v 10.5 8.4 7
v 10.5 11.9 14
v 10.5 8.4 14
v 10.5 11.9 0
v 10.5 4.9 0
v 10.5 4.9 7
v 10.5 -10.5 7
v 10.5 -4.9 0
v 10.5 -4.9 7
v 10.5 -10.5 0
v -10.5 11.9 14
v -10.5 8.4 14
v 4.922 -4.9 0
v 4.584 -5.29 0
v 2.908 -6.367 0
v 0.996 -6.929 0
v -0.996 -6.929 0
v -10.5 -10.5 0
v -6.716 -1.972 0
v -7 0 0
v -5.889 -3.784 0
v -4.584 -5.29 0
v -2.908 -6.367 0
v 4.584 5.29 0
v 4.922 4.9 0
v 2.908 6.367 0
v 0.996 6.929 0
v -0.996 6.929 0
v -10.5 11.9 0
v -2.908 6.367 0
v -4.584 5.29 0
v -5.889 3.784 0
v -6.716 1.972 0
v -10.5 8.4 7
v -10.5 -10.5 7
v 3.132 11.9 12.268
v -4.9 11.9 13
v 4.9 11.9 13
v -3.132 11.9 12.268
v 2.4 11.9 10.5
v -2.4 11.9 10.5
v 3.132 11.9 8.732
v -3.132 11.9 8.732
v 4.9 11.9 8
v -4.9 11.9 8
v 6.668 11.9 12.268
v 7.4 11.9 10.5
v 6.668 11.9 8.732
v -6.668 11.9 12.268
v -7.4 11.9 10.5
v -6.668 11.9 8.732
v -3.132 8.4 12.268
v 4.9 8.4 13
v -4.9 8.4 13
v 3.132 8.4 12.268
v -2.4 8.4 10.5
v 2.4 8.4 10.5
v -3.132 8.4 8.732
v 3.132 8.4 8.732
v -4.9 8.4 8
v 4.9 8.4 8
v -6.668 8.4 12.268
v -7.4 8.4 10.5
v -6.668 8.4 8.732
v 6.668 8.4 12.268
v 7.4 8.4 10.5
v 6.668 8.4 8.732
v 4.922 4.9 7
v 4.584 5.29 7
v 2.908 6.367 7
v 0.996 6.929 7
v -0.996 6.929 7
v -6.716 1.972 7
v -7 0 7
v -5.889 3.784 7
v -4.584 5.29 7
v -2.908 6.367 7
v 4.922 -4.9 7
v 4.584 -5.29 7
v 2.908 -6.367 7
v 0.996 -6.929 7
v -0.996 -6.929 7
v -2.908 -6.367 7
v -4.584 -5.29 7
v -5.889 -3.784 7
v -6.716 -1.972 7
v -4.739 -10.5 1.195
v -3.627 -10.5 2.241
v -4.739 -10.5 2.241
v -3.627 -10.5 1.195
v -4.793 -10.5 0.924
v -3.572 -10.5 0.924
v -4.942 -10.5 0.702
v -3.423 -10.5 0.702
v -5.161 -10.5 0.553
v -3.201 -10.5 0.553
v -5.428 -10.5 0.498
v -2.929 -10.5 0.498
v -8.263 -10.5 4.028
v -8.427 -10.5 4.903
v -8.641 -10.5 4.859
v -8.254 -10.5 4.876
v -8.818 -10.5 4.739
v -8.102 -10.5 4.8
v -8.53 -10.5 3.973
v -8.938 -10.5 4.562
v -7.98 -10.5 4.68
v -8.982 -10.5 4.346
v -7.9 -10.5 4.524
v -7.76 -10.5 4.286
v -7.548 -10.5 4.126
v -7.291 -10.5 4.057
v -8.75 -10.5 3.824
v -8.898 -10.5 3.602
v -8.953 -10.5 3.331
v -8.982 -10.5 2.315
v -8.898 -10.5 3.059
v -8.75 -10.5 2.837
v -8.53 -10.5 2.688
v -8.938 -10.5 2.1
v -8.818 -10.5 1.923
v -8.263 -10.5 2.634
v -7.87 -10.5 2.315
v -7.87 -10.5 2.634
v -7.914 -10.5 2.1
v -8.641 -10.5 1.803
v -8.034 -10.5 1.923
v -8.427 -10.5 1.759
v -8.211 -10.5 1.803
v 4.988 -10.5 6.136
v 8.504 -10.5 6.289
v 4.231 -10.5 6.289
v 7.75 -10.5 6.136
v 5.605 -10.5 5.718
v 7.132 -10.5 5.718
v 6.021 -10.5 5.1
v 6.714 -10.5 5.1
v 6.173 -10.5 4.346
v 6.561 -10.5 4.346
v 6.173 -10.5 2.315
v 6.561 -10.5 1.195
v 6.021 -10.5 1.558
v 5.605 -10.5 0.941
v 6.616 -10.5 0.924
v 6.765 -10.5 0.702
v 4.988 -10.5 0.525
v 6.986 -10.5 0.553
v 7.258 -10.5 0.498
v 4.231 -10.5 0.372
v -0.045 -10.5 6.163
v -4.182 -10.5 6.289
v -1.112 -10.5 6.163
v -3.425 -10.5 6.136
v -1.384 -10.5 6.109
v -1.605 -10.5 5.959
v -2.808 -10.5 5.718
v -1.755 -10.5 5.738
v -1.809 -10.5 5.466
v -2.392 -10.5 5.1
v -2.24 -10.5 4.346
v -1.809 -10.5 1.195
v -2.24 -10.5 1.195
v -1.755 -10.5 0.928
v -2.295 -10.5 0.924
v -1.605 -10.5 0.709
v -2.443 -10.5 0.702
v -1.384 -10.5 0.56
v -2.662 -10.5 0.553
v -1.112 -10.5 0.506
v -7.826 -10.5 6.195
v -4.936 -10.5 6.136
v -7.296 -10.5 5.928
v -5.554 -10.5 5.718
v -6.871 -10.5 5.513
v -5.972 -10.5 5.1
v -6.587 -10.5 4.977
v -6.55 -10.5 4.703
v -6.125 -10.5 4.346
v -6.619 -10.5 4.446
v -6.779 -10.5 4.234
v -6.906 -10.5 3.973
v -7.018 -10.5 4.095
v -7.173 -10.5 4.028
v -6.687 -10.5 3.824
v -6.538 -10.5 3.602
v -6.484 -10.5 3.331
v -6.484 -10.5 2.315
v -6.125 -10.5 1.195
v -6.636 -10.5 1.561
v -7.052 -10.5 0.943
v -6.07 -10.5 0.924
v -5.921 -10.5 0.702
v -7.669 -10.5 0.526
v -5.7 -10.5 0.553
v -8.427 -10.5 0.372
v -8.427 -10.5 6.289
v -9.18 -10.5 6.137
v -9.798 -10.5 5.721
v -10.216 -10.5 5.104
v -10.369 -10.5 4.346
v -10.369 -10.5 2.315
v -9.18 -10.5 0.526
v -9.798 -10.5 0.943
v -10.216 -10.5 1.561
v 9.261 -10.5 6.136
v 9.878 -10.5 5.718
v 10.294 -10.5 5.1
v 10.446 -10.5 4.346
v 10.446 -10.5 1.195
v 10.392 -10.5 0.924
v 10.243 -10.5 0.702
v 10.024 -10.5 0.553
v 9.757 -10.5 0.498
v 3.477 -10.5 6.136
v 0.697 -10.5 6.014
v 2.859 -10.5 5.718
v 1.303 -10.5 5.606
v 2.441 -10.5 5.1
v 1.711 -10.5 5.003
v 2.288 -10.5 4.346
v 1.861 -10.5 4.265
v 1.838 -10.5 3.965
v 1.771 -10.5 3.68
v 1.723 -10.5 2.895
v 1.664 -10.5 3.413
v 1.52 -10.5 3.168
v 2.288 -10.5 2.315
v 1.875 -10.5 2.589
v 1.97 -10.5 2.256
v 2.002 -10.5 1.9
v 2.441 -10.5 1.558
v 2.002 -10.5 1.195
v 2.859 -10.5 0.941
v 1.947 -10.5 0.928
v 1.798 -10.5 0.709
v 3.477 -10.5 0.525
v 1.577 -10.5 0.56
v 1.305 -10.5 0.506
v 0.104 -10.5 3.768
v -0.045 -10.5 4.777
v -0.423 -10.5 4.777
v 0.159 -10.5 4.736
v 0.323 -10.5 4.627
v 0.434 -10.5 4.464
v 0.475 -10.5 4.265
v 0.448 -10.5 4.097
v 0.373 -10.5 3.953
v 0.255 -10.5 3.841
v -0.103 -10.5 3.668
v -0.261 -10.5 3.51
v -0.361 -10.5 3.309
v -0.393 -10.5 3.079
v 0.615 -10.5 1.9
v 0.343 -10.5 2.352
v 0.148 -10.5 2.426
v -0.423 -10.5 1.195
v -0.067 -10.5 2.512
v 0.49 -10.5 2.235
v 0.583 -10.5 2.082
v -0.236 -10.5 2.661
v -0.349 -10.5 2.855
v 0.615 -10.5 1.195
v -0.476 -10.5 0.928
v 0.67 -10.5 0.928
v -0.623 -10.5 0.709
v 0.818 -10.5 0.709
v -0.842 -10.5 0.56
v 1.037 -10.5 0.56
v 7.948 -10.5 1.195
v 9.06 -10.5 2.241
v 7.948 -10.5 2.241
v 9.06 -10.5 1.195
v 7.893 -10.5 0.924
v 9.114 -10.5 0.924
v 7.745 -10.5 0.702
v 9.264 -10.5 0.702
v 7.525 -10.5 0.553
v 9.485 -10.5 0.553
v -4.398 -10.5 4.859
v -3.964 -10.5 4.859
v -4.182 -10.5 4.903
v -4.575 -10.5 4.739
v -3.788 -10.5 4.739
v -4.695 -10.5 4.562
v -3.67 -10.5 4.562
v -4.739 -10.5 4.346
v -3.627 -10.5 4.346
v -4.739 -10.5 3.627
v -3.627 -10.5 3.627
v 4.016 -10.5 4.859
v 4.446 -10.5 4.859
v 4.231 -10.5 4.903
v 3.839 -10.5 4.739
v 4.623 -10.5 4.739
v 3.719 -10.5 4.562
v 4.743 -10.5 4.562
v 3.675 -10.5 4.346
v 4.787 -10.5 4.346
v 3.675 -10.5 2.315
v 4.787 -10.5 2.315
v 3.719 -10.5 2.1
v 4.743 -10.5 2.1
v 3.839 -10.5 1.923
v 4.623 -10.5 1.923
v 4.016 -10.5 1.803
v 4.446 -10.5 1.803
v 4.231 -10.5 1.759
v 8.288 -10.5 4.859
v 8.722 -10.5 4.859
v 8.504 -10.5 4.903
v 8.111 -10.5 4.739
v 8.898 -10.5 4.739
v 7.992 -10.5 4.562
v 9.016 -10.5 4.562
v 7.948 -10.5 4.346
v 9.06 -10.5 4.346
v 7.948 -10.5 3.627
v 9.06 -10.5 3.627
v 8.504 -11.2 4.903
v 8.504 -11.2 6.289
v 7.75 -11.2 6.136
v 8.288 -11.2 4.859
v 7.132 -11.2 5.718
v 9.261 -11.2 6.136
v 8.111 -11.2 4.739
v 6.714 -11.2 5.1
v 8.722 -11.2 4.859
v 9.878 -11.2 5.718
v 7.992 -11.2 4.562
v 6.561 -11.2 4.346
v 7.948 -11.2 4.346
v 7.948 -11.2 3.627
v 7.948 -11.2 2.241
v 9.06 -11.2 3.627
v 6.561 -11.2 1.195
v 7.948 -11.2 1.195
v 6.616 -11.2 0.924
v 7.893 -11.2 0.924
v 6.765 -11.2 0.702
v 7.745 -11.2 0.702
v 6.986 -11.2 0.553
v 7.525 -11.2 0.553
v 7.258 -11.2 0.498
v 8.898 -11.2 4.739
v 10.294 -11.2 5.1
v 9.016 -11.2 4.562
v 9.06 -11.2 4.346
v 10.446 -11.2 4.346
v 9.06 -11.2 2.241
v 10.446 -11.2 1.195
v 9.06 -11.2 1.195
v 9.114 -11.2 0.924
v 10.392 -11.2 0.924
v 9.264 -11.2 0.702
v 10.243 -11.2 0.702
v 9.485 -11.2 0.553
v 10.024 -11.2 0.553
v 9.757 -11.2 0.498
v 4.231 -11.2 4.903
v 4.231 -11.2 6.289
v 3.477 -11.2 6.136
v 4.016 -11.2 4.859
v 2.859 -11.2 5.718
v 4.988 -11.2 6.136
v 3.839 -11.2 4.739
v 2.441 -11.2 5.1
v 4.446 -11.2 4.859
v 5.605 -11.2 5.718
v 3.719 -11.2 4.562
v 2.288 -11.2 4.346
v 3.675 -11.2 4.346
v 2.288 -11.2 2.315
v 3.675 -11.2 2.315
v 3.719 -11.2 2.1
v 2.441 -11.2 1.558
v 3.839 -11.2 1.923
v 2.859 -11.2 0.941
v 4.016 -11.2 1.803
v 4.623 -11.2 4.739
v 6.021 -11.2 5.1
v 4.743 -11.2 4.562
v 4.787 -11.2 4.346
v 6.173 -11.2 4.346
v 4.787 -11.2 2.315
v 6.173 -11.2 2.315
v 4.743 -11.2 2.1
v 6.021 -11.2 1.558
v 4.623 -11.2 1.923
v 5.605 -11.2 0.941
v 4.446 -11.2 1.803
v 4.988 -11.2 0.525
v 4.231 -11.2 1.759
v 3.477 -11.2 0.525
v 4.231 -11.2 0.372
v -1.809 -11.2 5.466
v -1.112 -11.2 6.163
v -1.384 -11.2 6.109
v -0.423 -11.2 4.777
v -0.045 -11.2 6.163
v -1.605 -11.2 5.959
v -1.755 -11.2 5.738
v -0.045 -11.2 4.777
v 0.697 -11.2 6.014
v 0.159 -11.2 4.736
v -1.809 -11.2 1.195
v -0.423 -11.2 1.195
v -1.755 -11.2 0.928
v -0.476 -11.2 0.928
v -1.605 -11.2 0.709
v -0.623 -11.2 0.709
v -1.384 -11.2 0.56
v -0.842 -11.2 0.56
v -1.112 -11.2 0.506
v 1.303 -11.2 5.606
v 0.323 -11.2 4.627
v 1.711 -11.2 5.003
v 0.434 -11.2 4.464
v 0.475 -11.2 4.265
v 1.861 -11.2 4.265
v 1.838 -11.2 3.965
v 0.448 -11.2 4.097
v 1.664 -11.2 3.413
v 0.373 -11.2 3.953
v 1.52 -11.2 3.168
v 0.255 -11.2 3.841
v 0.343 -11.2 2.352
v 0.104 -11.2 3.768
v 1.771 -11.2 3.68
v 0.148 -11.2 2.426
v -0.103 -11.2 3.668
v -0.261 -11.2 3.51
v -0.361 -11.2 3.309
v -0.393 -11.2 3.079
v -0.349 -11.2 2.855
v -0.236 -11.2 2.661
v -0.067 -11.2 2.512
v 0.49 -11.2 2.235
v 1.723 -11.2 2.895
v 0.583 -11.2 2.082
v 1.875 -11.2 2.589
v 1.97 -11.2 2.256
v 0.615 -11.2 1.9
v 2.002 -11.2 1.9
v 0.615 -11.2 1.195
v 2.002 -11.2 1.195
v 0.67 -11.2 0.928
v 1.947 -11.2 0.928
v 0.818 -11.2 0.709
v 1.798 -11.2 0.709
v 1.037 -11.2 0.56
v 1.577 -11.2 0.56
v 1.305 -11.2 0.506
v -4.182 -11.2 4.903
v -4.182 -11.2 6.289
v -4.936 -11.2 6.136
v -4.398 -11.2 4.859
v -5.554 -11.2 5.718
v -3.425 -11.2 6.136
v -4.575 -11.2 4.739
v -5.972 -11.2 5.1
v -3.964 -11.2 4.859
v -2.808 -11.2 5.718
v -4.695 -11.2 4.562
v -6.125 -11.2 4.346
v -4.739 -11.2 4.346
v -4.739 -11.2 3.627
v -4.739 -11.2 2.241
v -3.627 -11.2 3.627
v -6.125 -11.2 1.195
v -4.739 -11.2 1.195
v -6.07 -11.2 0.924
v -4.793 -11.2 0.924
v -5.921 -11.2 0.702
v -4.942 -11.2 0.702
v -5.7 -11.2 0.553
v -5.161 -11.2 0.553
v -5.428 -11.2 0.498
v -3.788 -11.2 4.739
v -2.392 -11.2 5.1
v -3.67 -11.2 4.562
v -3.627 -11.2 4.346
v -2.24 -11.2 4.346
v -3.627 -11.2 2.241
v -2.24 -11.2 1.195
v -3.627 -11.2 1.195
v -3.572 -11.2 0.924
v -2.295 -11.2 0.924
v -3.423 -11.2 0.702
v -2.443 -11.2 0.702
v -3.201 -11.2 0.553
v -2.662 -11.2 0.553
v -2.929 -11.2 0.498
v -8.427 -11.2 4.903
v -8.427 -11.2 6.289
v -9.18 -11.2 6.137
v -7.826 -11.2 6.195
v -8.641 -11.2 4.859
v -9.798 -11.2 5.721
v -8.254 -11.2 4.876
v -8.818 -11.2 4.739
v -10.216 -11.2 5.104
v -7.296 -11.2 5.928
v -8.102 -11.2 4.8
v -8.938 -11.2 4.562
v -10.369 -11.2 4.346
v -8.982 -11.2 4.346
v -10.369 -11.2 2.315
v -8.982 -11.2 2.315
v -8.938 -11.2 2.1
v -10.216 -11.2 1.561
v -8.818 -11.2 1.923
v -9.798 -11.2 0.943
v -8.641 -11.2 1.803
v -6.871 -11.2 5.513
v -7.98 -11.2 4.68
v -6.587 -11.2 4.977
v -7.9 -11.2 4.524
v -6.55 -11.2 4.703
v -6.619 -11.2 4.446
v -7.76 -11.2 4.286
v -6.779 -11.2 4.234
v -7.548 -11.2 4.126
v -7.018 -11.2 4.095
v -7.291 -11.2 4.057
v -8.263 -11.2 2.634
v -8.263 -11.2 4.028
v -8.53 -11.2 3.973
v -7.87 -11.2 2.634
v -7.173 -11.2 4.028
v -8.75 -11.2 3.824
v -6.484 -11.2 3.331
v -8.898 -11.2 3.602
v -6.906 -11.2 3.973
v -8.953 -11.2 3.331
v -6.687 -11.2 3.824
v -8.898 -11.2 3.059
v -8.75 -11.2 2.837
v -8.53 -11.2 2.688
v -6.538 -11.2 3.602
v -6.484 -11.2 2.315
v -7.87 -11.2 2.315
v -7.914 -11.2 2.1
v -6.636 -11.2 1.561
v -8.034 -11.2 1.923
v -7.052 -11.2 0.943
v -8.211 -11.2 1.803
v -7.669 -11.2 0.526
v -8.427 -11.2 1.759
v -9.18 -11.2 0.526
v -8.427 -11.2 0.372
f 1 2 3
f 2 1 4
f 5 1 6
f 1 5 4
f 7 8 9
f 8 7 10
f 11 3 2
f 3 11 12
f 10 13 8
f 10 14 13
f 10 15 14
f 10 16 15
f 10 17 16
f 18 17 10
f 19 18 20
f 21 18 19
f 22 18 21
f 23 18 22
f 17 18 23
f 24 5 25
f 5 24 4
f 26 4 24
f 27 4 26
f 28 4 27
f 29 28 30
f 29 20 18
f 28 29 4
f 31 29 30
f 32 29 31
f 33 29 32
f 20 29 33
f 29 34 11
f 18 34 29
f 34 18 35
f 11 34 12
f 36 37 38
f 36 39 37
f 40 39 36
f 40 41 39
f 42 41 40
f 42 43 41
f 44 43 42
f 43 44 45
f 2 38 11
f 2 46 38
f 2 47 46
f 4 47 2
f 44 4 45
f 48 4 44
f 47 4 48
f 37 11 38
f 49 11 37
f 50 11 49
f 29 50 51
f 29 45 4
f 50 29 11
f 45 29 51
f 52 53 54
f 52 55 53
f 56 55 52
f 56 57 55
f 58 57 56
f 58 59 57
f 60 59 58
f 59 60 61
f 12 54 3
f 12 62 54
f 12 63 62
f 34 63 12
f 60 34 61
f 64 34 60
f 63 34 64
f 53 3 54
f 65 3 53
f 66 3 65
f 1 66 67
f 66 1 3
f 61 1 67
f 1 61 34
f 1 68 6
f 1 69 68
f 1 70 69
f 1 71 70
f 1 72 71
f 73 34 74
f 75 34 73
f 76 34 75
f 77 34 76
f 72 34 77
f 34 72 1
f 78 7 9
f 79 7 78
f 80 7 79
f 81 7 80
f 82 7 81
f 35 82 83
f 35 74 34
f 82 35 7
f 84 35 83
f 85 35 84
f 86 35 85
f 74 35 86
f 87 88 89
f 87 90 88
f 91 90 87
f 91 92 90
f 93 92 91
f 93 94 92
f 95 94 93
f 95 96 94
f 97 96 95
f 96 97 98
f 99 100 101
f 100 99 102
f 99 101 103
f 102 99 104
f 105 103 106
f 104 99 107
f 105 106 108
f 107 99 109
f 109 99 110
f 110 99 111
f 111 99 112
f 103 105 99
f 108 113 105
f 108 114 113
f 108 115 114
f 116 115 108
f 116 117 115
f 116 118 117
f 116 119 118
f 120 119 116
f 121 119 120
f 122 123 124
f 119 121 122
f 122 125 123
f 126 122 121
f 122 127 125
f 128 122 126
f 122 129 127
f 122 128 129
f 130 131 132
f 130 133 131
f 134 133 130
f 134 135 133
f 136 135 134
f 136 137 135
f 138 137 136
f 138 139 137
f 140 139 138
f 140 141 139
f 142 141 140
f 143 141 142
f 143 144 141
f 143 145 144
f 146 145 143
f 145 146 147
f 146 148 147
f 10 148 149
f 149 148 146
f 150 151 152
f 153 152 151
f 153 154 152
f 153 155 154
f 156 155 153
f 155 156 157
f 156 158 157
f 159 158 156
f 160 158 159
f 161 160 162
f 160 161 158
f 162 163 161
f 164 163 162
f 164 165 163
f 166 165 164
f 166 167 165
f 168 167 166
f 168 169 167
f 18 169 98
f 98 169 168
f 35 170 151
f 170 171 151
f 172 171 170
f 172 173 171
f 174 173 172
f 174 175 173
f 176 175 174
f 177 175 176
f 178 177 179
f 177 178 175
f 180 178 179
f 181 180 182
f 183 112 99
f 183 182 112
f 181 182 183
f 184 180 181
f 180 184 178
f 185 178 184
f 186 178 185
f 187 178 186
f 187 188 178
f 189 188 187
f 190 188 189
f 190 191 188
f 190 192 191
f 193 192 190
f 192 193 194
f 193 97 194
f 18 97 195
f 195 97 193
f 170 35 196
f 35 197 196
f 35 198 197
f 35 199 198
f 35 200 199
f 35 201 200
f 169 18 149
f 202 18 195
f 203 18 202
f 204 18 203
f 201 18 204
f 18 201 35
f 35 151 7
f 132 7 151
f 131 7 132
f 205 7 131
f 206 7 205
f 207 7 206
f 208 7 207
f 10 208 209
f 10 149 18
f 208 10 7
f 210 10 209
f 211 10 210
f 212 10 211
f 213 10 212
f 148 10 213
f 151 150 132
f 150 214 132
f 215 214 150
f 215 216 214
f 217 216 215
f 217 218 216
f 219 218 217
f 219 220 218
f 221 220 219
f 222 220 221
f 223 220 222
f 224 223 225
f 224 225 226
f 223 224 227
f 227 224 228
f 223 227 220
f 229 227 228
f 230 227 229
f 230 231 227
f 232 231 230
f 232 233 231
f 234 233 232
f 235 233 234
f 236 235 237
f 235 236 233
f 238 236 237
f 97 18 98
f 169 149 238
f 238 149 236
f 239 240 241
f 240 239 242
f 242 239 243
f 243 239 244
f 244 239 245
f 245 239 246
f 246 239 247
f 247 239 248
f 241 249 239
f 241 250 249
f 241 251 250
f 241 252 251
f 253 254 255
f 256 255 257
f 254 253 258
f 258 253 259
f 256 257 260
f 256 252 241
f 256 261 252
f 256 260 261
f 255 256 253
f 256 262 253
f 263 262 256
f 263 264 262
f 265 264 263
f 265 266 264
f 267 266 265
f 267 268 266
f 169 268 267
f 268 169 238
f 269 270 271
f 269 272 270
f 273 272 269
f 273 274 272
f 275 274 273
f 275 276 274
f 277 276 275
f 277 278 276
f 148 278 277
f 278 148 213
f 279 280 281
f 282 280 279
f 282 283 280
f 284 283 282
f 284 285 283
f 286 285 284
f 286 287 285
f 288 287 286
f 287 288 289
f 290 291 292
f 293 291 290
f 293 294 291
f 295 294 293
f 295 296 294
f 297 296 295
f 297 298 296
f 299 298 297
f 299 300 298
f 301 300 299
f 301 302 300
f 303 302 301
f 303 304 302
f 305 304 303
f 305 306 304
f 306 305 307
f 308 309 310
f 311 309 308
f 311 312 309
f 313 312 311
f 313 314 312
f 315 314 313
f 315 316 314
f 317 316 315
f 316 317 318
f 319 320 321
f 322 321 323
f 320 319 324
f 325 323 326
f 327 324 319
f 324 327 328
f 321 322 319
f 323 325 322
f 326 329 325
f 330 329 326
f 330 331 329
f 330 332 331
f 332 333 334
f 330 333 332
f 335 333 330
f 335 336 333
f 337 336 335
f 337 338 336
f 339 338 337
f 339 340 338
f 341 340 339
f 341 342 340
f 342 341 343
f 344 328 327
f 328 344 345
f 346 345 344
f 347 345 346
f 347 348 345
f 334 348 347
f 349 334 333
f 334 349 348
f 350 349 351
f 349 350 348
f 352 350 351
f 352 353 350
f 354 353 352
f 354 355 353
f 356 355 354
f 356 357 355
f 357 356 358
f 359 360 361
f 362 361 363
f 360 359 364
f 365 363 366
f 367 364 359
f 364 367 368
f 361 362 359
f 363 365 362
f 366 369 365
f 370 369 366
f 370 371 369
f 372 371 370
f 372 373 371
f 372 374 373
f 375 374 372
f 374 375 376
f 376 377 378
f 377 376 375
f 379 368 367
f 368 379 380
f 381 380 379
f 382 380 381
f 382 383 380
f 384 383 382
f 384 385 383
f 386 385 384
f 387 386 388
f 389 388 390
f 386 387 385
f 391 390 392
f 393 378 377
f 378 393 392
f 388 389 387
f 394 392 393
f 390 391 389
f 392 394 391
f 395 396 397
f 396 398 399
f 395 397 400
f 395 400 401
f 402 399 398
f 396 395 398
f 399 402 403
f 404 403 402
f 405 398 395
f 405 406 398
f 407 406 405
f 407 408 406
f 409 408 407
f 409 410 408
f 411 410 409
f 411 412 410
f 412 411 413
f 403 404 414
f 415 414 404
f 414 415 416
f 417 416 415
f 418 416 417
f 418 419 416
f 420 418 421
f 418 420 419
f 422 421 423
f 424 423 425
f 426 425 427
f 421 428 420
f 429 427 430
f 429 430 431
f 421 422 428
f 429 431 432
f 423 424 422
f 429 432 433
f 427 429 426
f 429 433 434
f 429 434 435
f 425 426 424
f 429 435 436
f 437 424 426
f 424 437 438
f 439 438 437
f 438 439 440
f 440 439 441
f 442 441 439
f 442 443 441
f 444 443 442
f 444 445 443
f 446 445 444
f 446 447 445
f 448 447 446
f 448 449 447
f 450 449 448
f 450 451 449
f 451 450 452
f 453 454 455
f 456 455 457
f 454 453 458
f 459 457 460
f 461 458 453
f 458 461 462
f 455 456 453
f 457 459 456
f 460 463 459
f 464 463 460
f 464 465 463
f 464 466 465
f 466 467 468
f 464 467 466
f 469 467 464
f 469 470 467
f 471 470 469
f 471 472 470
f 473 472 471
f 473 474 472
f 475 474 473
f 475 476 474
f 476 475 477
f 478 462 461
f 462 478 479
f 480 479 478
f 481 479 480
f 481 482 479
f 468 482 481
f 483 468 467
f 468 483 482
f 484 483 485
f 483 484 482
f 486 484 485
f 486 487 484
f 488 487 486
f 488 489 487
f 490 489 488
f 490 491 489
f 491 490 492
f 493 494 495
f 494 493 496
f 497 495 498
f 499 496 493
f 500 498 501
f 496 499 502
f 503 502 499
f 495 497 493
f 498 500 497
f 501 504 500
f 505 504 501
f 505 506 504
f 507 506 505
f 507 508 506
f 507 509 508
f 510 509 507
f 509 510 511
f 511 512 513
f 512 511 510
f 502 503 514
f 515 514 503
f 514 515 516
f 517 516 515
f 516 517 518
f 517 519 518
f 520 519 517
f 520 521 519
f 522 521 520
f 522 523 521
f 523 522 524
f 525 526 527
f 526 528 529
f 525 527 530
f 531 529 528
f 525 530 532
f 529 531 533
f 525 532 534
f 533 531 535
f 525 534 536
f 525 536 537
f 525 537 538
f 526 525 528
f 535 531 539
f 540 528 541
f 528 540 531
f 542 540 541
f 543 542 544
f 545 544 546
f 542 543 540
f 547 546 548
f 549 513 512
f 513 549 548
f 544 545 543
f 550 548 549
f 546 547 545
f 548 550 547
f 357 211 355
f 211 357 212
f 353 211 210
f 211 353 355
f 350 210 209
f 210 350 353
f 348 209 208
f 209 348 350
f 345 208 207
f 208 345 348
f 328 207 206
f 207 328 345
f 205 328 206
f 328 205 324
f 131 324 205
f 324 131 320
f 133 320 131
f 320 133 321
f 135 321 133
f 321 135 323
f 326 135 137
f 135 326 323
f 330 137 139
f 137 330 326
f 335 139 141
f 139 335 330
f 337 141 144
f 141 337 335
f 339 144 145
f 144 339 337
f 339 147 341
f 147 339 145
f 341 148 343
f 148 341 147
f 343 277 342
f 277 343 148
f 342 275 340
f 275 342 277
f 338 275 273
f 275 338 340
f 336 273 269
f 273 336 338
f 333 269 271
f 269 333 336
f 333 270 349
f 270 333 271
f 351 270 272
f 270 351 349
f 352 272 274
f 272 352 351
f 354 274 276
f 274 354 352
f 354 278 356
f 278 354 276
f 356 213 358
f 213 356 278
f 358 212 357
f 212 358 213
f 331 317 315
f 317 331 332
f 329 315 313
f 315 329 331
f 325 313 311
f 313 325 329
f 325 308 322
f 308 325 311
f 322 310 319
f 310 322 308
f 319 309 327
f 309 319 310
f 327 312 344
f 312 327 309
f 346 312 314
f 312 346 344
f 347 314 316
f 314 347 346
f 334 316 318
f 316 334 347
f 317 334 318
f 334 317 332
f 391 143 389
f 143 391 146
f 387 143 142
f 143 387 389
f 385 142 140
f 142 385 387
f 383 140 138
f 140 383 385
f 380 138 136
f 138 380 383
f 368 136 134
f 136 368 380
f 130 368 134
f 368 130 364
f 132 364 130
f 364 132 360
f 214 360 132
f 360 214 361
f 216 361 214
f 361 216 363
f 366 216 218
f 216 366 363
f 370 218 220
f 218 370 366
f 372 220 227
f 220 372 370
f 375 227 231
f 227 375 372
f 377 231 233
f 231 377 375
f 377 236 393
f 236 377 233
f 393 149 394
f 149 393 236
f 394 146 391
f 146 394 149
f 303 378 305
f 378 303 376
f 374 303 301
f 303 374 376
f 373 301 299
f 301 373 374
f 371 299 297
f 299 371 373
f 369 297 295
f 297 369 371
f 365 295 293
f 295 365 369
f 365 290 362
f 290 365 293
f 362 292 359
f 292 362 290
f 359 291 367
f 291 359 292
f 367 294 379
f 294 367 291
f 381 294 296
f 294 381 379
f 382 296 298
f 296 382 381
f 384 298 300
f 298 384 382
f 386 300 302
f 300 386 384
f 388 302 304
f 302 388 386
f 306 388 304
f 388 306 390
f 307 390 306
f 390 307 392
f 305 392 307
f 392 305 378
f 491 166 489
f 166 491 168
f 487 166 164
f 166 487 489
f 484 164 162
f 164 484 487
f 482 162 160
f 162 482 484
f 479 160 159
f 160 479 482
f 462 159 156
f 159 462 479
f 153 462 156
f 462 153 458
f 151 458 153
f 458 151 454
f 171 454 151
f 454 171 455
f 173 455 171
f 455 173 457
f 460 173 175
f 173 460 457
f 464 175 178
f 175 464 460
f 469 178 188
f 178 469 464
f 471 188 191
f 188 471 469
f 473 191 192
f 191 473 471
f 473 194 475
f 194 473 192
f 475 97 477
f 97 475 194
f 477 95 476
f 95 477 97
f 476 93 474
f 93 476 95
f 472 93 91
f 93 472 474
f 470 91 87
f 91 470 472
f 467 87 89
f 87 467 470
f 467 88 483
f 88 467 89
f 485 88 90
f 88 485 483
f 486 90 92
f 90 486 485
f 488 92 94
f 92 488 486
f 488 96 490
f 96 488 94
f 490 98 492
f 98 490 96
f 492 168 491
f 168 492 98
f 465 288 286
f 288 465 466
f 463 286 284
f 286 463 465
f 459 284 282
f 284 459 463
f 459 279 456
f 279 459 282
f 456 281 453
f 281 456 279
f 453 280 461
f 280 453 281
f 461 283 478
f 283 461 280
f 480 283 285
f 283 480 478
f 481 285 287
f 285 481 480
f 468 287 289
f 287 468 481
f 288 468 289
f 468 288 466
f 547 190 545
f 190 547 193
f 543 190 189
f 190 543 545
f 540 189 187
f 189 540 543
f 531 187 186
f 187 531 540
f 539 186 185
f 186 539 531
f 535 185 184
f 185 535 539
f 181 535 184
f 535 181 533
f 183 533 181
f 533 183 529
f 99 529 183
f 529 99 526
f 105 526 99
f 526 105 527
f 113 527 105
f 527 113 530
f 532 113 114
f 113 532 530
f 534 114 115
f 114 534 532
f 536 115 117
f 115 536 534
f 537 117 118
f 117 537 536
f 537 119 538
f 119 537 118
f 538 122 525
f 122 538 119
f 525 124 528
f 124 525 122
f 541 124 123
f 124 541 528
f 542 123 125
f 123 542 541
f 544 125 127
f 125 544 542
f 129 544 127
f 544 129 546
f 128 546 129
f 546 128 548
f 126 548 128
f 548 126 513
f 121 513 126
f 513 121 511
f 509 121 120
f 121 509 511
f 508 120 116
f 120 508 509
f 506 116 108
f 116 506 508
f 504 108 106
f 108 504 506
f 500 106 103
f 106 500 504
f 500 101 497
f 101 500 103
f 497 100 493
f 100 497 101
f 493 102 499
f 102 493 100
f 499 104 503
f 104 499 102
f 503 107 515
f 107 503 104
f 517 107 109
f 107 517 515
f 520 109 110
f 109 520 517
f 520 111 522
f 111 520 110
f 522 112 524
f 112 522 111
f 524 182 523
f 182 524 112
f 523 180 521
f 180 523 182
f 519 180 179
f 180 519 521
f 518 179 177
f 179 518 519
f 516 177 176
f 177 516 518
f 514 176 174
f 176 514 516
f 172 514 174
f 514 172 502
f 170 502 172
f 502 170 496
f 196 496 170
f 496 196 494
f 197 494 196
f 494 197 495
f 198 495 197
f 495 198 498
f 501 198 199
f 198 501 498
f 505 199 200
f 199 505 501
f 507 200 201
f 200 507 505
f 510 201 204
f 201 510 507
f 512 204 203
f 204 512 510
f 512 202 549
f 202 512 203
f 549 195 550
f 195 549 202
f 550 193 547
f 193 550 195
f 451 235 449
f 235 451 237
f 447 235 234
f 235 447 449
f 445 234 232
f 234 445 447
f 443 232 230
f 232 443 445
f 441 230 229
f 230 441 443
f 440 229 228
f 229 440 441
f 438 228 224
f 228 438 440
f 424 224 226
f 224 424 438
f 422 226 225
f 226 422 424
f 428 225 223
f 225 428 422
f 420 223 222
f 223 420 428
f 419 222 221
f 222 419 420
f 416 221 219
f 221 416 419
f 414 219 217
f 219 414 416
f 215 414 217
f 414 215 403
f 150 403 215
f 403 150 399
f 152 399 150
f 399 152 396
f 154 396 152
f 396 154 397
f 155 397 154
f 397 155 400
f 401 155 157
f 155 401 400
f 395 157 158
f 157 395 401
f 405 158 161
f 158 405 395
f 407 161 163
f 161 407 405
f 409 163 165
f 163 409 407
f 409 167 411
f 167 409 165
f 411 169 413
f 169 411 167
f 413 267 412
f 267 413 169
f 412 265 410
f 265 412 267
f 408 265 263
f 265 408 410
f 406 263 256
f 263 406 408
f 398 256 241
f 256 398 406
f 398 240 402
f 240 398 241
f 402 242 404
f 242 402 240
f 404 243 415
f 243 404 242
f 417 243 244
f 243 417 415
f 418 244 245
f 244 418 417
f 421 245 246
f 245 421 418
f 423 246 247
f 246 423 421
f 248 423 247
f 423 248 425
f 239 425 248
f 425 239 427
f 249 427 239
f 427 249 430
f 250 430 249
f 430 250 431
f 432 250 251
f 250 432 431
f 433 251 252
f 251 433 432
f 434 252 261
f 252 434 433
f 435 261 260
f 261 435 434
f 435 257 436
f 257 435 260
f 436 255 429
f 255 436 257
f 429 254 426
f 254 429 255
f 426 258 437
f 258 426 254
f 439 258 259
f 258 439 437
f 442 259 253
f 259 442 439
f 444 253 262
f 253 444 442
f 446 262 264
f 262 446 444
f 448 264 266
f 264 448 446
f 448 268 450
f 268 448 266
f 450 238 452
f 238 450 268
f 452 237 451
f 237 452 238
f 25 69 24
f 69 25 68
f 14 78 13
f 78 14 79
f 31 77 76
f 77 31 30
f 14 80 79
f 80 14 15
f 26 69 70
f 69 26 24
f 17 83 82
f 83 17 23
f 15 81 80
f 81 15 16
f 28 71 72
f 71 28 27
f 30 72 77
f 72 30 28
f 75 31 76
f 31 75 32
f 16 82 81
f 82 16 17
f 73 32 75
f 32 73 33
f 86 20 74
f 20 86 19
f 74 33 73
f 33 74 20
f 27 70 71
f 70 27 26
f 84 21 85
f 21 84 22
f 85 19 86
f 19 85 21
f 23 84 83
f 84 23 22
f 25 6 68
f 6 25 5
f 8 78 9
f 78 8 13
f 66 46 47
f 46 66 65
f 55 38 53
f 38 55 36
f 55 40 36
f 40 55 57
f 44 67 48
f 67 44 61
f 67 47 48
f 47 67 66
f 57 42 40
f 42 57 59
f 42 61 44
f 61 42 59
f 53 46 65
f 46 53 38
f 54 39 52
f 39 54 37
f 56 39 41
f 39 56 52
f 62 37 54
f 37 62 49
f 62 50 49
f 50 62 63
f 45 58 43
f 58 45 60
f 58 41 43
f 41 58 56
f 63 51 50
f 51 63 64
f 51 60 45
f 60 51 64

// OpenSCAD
// (c) 2012 Felipe Correa da Silva Sanches <fsanches@metamaquina.com.br>
// licensed under GPL v3 or (at your option) any later version.

raio_da_mangueira = 7;
raio_do_parafuso = 2.5;

module suporte_para_chuveirinho(){
	difference(){
		union(){
			translate([-1.5*raio_da_mangueira, 1.2*raio_da_mangueira,0]) cube([3*raio_da_mangueira, 0.5*raio_da_mangueira,2*raio_da_mangueira]);
			translate([-1.5*raio_da_mangueira, -1.5*raio_da_mangueira,0]) cube([3*raio_da_mangueira, 3*raio_da_mangueira,raio_da_mangueira]);
			translate([-1.5*raio_da_mangueira -0.8, -1.5*raio_da_mangueira +0.5, 0]) scale(0.4) rotate([90, 0, 0]) linear_extrude(height=3) import (file="GAROA.dxf");
		}

		//furo para a mangueira
		translate([0,0,-5*raio_da_mangueira]) cylinder(r=raio_da_mangueira, h=10*raio_da_mangueira);
		translate([0,-0.7*raio_da_mangueira,-1]) cube([2*raio_da_mangueira, 1.4*raio_da_mangueira, raio_da_mangueira+2]);

		//furos para parafusos
		translate([0.7*raio_da_mangueira,2*raio_da_mangueira,1.5*raio_da_mangueira]) rotate([90,0,0]) cylinder(r=raio_do_parafuso, h=raio_da_mangueira);
		translate([-0.7*raio_da_mangueira,2*raio_da_mangueira,1.5*raio_da_mangueira]) rotate([90,0,0]) cylinder(r=raio_do_parafuso, h=raio_da_mangueira);
	}
}

suporte_para_chuveirinho();
